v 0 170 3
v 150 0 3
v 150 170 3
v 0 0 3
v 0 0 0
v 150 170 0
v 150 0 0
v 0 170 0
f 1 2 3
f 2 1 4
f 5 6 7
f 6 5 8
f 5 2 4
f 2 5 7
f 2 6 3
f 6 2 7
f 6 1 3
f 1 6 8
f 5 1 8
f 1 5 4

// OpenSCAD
//for apporopriate alignment of the grid
xoff = 0.55;
yoff = 1.65;
zoff = 2;
plat = 150;
scaleFac = 25.4;
t0 = "O";
t1 = "N";
t2 = "E";
t3 = "1";
f0 = "Letters/";
f1 = "Letters/";
f2 = "Letters/";
f3 = "Numbers/";
font = "_alpha.dxf";
braille = false;
//quadrant title offsets
qxoff = 30;
qyoff = 8;

//remove excess grid/plot
difference() {
	//align and union the grid and plot
	translate(v = [xoff,yoff,zoff]) { 
		union() {
			linear_extrude(file = "Grid/cleanGrid1.dxf", height = 3, center = false);
			if (braille) {
				linear_extrude(file = "Grid/gridNum.dxf", height = 5, center = false);
			} else { 
				linear_extrude(file = "Grid/gridNum_alpha.dxf", height = 5, center = false);
			}		
			scale(v = [scaleFac,scaleFac,0])linear_extrude(file = "Q.dxf", height = 5, center = false);
		}
	}
	
	//blocks to remove excess
	union() {
		translate(v=[-20,-10,0]) cube(size = [20,170,10], center=false);
		translate(v=[0,-20,0]) cube(size = [170,20,10], center=false);
	}
}

//grid platform
cube(size = [plat,plat+20,3], center = false);
//title bar
first = 10;
translate(v=[first,plat+qyoff,zoff]) linear_extrude(file = str(f0,t0,font), height = 5 , center = false);
translate(v=[first+15,plat+qyoff,zoff]) linear_extrude(file = str(f1,t1,font), height = 5 , center = false);
translate(v=[first+30,plat+qyoff,zoff]) linear_extrude(file = str(f2,t2,font), height = 5 , center = false);
translate(v=[first+45,plat+qyoff,zoff]) linear_extrude(file = str(f3,t3,font), height = 5 , center = false);
if (braille) {
	translate(v=[plat-qxoff,plat+qyoff,zoff]) linear_extrude(file = "Grid/one.dxf", height = 5 , center = false);		
} else {
	translate(v=[plat-qxoff,plat+qyoff,zoff]) linear_extrude(file = "Grid/one_alpha.dxf", height = 5 , center = false);		
}
